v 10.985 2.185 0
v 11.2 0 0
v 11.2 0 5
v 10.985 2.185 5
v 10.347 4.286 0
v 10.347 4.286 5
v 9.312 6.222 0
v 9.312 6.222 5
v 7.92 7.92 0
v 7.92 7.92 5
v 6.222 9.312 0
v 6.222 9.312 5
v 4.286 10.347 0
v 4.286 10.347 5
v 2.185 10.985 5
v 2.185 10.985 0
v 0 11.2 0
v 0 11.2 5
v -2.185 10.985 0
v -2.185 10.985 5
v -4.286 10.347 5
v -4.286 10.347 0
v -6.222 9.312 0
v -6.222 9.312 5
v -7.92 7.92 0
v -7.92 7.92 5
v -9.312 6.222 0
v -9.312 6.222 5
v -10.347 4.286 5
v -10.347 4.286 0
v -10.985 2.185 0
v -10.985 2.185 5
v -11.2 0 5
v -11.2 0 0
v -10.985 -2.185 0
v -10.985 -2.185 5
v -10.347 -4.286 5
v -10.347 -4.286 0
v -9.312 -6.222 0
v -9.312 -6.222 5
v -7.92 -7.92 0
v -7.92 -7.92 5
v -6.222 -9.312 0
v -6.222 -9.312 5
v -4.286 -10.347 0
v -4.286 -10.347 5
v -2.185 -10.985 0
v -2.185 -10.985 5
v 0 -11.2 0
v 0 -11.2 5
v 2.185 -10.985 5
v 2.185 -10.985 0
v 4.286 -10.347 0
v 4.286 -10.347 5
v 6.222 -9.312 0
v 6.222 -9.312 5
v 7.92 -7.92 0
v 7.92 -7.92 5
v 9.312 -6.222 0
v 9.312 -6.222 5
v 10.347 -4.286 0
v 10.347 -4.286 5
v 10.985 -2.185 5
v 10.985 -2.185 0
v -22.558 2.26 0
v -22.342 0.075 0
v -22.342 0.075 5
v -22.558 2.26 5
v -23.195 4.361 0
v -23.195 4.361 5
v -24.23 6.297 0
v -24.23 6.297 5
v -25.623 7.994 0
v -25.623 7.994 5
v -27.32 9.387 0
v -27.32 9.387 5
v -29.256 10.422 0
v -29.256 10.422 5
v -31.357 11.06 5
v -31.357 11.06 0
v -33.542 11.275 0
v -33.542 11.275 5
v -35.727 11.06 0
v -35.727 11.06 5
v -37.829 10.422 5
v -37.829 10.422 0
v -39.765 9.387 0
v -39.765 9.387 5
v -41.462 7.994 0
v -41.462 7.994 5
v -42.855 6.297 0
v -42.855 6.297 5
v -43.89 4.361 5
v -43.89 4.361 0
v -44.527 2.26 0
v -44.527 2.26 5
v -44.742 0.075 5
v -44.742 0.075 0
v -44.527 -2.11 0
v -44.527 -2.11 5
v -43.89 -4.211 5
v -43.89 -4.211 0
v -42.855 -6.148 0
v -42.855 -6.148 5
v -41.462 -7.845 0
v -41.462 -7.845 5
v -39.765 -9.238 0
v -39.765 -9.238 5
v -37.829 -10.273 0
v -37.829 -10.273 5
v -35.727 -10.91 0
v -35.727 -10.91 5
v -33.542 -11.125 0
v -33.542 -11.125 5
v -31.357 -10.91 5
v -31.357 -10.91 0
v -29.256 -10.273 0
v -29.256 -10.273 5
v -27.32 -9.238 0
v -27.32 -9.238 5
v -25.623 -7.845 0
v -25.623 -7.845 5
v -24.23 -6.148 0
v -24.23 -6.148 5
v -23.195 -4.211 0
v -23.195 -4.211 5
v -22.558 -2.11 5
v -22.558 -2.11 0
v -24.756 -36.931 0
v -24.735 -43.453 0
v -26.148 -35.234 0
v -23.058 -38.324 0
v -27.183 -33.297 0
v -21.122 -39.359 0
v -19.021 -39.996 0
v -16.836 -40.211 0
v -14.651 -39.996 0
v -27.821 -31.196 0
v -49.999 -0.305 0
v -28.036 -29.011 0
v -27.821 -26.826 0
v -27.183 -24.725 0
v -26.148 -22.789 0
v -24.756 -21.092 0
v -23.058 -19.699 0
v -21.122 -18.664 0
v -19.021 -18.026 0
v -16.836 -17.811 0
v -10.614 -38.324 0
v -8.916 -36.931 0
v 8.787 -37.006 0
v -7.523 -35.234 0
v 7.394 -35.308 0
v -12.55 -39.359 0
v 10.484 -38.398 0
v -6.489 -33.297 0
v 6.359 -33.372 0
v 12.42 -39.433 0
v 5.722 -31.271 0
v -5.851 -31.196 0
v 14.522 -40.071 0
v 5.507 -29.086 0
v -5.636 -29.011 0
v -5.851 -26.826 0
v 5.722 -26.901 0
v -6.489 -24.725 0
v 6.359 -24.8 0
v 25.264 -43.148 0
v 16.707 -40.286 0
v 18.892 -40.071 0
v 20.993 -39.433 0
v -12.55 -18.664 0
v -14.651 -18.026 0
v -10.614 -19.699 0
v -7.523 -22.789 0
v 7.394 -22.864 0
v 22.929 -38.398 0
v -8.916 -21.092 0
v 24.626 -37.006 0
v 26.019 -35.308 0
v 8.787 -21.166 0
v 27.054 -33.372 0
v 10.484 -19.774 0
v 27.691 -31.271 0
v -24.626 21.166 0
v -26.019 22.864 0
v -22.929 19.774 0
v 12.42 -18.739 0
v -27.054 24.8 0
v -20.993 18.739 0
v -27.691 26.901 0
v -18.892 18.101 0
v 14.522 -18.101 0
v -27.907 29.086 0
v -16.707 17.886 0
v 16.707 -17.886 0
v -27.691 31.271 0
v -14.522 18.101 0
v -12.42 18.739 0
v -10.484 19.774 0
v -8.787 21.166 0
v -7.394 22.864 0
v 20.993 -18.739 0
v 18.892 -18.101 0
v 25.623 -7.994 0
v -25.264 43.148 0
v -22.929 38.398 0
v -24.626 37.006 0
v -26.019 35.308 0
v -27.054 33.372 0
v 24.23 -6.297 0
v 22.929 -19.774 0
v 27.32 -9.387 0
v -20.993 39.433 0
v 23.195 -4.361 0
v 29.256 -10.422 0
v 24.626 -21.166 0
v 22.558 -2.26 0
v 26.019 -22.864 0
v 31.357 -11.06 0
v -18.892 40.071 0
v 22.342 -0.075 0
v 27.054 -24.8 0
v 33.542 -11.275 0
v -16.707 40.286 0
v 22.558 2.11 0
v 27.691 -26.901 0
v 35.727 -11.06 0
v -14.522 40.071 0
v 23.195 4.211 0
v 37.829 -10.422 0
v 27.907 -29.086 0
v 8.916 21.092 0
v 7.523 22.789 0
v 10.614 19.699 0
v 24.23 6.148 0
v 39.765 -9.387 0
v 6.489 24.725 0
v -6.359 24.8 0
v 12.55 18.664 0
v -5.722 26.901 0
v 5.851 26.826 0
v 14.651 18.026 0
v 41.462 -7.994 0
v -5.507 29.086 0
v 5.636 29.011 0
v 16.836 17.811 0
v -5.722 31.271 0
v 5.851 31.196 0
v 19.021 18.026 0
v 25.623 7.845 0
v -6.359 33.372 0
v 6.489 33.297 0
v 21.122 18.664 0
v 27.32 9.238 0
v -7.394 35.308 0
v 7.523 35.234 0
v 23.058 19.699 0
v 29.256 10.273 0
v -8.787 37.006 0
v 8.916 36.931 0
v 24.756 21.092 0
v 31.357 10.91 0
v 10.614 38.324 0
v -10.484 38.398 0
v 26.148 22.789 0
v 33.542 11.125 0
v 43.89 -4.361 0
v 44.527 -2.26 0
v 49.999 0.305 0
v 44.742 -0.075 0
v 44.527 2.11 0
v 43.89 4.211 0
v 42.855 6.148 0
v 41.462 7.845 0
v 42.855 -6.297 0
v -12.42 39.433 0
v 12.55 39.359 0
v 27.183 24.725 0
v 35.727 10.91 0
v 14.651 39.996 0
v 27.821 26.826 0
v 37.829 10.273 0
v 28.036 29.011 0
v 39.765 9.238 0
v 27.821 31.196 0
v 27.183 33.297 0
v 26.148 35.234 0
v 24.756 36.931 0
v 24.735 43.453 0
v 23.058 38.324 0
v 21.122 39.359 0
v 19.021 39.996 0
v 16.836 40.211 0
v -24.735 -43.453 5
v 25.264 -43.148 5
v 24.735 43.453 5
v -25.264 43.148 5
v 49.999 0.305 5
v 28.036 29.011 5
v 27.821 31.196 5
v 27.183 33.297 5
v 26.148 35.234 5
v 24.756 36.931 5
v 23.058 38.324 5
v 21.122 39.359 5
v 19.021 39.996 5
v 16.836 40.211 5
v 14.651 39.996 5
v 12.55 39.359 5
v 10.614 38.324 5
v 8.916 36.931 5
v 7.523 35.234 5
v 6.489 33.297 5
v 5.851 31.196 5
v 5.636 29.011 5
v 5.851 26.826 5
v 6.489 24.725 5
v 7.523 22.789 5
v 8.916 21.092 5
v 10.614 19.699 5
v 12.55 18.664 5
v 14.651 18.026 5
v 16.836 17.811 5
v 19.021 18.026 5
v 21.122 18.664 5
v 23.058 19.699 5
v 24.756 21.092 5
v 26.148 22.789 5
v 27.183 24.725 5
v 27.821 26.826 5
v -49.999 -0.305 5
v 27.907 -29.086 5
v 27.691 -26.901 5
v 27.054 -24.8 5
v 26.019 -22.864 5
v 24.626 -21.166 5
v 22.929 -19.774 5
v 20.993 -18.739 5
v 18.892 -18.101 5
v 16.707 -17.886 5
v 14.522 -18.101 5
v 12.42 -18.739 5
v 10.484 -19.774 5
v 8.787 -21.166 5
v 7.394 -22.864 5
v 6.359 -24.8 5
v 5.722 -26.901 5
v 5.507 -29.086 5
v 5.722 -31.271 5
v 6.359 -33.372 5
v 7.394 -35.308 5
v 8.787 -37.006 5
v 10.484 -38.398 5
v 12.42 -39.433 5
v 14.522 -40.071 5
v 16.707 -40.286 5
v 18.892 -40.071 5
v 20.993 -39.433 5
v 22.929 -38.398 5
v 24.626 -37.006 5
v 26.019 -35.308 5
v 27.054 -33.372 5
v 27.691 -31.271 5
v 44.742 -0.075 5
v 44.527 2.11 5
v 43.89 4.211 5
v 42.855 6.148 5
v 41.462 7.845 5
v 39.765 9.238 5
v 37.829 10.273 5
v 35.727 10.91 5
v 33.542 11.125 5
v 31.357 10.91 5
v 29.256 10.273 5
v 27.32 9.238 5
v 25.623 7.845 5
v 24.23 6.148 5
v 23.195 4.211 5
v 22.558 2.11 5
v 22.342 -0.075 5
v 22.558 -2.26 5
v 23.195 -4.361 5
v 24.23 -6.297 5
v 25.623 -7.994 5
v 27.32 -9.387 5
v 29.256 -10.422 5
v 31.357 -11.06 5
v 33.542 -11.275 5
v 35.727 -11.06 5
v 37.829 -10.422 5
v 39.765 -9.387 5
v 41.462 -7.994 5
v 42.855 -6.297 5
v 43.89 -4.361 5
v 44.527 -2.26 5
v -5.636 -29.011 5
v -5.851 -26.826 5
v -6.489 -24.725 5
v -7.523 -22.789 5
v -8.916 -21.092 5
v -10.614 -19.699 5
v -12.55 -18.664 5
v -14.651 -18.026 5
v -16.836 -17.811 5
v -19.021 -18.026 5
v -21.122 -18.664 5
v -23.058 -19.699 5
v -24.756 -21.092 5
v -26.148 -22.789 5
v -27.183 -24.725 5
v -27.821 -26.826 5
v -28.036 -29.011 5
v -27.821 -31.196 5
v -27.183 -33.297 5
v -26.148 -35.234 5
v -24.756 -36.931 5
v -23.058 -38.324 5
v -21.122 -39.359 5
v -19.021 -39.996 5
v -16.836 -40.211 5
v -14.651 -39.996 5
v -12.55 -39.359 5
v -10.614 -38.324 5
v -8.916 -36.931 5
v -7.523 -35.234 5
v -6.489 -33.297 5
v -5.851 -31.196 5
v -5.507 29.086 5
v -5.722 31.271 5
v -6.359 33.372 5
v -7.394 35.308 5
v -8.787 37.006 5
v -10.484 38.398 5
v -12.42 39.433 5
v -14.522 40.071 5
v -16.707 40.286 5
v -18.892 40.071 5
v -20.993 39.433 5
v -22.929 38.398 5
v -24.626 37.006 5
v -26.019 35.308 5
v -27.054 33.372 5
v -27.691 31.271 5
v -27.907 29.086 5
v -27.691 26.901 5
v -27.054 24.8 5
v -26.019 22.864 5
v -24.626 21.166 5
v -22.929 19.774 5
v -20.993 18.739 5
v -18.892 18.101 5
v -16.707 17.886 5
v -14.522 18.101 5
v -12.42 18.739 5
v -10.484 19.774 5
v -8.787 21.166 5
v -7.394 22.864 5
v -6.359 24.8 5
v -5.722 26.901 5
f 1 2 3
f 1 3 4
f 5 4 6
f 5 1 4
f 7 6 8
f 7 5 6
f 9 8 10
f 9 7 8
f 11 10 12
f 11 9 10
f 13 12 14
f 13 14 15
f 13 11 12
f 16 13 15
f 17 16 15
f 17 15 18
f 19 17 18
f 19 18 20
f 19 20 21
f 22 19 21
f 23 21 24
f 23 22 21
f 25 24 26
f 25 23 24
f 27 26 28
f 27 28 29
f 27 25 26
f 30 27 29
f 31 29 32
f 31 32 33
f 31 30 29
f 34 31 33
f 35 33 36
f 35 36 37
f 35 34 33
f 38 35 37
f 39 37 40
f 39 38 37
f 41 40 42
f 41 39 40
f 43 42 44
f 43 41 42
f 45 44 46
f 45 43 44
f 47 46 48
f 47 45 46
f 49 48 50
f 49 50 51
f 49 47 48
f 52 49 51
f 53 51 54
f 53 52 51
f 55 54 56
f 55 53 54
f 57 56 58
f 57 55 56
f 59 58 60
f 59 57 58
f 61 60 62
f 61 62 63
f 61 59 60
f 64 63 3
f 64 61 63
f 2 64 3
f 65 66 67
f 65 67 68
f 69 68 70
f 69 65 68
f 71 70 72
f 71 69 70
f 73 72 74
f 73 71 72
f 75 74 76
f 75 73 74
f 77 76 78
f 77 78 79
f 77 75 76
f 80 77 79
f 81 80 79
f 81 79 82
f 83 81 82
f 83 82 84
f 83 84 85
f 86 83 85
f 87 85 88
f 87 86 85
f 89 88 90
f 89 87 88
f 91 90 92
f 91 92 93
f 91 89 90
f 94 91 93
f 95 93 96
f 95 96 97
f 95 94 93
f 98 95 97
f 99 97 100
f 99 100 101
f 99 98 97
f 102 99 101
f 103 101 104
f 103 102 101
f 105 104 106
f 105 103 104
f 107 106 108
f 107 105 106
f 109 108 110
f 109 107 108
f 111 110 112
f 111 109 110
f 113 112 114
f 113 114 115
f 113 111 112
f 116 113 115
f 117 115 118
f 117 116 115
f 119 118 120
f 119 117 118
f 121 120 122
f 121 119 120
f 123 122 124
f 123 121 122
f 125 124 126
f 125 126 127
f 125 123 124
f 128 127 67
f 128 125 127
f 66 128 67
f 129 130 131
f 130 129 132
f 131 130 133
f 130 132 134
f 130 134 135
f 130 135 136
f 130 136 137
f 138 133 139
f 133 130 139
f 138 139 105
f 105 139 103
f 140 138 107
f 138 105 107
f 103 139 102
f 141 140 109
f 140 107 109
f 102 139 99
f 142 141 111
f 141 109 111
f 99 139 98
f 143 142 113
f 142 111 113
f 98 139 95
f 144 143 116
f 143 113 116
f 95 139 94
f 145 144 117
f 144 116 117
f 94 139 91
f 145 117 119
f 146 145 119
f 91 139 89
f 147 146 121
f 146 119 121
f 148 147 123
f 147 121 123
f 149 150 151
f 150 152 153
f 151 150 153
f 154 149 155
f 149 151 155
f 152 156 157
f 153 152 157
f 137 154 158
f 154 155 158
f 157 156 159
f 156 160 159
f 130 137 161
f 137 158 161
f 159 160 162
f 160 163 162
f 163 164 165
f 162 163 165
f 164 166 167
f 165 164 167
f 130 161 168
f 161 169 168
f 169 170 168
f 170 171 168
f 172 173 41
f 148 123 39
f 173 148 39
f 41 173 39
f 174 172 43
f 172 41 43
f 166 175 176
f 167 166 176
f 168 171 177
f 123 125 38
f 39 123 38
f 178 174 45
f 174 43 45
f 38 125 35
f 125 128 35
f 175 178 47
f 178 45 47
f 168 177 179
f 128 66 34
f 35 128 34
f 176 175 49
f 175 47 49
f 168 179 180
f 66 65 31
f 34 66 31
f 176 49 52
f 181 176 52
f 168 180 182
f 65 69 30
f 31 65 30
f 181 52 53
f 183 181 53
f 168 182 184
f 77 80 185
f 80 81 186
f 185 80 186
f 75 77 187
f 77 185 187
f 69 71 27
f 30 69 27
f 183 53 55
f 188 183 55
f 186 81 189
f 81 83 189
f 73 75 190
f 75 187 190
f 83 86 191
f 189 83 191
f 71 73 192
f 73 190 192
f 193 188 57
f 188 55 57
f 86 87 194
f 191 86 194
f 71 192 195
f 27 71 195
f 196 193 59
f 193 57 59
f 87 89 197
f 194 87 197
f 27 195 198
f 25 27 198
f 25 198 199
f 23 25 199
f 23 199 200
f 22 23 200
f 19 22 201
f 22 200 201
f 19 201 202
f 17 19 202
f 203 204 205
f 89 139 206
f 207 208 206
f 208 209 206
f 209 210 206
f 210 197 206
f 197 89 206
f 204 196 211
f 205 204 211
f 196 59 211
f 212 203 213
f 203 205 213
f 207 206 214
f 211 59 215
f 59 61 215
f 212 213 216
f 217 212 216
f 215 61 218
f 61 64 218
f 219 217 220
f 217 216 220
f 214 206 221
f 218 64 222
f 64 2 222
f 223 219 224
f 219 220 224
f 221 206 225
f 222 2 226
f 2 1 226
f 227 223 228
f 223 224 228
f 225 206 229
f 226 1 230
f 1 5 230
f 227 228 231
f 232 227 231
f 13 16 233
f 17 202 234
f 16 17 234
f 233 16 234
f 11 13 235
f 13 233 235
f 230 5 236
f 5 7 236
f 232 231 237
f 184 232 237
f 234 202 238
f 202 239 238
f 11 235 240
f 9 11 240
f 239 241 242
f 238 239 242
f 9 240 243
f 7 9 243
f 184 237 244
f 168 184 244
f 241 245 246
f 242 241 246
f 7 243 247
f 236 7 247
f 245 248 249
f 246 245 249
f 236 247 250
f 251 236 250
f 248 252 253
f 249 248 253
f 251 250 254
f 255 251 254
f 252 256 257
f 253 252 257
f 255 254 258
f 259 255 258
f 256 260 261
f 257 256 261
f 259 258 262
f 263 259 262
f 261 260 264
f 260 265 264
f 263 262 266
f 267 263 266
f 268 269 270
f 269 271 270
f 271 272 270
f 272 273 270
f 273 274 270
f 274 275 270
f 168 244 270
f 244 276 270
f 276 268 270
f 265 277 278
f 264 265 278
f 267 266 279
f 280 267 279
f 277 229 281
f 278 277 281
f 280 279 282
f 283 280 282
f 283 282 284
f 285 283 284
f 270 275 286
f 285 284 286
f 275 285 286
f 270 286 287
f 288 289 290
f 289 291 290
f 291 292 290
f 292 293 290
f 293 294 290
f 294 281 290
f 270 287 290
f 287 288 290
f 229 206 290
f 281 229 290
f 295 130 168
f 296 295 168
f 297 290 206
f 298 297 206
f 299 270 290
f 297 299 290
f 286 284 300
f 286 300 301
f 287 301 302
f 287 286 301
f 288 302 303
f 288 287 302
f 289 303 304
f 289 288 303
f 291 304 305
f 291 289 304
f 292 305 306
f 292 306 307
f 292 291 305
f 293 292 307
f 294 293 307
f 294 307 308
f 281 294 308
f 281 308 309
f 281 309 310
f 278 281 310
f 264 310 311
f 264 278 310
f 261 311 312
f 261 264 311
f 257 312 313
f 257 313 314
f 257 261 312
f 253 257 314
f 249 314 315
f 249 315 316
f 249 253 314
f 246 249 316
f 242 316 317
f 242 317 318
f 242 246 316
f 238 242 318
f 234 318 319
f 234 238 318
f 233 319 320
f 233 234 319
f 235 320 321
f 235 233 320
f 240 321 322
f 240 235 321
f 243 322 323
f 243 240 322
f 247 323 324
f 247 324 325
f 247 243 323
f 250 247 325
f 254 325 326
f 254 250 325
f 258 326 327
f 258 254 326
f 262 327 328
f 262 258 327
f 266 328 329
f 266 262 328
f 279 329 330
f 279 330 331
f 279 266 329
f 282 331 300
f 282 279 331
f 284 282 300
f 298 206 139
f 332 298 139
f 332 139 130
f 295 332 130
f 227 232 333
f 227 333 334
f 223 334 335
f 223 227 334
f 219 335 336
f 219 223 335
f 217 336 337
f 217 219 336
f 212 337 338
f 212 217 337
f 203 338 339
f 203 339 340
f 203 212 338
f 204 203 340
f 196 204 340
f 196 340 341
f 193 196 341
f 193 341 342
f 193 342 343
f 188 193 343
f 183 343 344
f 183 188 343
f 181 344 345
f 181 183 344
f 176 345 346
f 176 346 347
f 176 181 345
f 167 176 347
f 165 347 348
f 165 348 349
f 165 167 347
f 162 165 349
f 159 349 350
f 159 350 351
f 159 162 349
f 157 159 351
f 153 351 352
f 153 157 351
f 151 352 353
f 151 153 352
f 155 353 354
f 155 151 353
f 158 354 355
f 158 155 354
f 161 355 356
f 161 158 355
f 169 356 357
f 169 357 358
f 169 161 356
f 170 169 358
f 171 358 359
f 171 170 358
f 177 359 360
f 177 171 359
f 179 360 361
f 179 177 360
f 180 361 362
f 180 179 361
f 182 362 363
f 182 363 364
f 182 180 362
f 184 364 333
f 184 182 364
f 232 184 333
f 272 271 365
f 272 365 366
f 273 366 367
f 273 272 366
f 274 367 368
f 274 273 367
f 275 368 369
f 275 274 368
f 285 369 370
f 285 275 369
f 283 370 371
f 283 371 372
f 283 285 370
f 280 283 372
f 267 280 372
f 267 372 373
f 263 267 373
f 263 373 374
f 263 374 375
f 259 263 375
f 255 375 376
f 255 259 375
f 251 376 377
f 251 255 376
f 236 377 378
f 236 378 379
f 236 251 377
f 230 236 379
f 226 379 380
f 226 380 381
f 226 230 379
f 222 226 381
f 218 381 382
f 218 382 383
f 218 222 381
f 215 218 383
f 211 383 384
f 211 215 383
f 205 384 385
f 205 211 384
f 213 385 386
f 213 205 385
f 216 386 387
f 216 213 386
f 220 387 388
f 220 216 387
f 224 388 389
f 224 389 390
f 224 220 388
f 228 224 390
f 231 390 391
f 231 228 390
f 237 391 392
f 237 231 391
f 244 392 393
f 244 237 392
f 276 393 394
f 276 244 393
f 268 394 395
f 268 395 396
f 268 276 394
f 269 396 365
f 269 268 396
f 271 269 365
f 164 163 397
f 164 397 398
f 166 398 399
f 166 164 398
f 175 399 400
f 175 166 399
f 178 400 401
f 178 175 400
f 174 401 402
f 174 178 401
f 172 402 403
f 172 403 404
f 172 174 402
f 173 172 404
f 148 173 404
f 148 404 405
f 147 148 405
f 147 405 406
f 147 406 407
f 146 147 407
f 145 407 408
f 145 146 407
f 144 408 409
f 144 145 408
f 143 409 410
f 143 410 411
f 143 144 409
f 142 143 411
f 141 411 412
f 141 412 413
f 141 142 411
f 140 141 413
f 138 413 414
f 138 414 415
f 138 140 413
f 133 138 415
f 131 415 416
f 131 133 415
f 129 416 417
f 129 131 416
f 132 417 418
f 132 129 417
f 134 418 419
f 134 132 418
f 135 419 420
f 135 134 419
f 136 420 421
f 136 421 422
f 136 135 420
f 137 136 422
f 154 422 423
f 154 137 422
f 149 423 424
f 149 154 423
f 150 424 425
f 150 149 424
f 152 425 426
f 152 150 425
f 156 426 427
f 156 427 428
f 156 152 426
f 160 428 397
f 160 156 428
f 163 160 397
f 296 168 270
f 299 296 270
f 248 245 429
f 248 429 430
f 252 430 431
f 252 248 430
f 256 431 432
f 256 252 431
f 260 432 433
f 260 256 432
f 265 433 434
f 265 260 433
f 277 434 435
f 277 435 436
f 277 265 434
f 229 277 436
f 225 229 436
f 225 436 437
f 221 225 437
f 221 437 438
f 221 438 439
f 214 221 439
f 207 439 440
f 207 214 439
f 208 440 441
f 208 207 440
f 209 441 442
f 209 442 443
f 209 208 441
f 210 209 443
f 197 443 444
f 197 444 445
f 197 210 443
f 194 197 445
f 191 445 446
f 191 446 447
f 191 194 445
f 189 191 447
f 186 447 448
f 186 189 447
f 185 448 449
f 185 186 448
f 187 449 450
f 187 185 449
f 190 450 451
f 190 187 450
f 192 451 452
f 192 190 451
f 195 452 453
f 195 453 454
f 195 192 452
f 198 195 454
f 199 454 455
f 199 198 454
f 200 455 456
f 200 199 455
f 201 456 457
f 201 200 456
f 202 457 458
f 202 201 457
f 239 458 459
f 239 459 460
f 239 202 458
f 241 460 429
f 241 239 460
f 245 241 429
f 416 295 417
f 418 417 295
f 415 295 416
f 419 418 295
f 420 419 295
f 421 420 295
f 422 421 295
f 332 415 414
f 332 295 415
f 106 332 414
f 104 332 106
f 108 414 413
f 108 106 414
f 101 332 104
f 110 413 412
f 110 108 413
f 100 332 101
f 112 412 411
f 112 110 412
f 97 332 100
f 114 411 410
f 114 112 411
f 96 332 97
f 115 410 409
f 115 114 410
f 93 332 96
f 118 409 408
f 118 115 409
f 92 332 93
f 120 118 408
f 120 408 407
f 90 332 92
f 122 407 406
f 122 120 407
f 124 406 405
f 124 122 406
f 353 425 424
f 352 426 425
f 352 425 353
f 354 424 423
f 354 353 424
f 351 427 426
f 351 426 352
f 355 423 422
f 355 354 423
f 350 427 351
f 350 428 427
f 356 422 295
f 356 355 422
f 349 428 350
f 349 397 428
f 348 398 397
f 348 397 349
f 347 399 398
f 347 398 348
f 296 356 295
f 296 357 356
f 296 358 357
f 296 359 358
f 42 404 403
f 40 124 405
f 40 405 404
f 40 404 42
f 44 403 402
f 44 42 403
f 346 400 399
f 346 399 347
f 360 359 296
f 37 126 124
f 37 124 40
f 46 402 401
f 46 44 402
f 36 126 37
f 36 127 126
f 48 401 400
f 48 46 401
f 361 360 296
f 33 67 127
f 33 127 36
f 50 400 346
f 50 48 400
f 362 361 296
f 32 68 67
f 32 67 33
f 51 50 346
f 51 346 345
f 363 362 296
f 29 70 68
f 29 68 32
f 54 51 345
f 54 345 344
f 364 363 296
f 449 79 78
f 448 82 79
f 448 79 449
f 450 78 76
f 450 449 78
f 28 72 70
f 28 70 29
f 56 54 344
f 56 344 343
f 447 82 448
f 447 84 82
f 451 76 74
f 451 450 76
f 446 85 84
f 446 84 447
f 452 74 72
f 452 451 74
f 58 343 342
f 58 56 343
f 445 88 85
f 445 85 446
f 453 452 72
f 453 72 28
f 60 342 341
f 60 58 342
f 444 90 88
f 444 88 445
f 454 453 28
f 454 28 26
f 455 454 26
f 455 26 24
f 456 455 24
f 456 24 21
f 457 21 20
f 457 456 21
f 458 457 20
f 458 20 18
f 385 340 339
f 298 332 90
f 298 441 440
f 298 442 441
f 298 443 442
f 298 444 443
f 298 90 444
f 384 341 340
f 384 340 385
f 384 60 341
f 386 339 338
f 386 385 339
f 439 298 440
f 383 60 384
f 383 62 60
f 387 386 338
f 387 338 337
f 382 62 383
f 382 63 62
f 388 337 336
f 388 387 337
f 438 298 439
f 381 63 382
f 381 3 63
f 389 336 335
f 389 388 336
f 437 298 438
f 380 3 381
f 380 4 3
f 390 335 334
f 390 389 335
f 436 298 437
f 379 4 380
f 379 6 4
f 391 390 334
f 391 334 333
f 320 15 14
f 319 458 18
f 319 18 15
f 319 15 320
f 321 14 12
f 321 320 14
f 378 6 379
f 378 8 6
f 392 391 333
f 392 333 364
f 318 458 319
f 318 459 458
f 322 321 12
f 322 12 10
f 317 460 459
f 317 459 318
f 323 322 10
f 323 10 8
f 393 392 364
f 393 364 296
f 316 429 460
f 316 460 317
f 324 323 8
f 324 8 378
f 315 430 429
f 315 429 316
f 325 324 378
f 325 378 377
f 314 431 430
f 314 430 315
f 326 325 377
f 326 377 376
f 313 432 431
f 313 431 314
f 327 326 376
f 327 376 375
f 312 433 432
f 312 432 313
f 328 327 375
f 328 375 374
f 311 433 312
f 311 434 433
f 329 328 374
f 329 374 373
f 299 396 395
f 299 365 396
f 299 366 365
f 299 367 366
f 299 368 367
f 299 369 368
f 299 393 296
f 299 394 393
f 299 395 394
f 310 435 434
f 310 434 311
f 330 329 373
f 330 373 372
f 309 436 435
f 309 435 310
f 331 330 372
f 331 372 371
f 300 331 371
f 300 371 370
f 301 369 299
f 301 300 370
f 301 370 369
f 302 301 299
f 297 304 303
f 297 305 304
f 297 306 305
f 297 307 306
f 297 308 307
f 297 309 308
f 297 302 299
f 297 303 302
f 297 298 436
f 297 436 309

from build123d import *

# Parameters (mm, degrees)
F0_R     = 11.2
F1_DEPTH = 5


with BuildPart() as f1:
    # F0 (on Top) → F1 (new body)
    with BuildSketch(Plane.XY):
        Polygon((49.999069, 0.305094), (24.735316, 43.453011), (-25.263753, 43.147917), (-49.999069, -0.305094), (-24.735316, -43.453011), (25.263753, -43.147917), align=None)
        with Locations((-16.835953, -29.011287)):
            Circle(F0_R, mode=Mode.SUBTRACT)
        with Locations((16.706536, -29.086007)):
            Circle(F0_R, mode=Mode.SUBTRACT)
        with Locations((33.542488, -0.074719)):
            Circle(F0_R, mode=Mode.SUBTRACT)
        with Locations((-33.542488, 0.074719)):
            Circle(F0_R, mode=Mode.SUBTRACT)
        with Locations((-16.706536, 29.086007)):
            Circle(F0_R, mode=Mode.SUBTRACT)
        Circle(F0_R, mode=Mode.SUBTRACT)
        with Locations((16.835953, 29.011287)):
            Circle(F0_R, mode=Mode.SUBTRACT)
    extrude(amount=F1_DEPTH)


solid = f1.part
